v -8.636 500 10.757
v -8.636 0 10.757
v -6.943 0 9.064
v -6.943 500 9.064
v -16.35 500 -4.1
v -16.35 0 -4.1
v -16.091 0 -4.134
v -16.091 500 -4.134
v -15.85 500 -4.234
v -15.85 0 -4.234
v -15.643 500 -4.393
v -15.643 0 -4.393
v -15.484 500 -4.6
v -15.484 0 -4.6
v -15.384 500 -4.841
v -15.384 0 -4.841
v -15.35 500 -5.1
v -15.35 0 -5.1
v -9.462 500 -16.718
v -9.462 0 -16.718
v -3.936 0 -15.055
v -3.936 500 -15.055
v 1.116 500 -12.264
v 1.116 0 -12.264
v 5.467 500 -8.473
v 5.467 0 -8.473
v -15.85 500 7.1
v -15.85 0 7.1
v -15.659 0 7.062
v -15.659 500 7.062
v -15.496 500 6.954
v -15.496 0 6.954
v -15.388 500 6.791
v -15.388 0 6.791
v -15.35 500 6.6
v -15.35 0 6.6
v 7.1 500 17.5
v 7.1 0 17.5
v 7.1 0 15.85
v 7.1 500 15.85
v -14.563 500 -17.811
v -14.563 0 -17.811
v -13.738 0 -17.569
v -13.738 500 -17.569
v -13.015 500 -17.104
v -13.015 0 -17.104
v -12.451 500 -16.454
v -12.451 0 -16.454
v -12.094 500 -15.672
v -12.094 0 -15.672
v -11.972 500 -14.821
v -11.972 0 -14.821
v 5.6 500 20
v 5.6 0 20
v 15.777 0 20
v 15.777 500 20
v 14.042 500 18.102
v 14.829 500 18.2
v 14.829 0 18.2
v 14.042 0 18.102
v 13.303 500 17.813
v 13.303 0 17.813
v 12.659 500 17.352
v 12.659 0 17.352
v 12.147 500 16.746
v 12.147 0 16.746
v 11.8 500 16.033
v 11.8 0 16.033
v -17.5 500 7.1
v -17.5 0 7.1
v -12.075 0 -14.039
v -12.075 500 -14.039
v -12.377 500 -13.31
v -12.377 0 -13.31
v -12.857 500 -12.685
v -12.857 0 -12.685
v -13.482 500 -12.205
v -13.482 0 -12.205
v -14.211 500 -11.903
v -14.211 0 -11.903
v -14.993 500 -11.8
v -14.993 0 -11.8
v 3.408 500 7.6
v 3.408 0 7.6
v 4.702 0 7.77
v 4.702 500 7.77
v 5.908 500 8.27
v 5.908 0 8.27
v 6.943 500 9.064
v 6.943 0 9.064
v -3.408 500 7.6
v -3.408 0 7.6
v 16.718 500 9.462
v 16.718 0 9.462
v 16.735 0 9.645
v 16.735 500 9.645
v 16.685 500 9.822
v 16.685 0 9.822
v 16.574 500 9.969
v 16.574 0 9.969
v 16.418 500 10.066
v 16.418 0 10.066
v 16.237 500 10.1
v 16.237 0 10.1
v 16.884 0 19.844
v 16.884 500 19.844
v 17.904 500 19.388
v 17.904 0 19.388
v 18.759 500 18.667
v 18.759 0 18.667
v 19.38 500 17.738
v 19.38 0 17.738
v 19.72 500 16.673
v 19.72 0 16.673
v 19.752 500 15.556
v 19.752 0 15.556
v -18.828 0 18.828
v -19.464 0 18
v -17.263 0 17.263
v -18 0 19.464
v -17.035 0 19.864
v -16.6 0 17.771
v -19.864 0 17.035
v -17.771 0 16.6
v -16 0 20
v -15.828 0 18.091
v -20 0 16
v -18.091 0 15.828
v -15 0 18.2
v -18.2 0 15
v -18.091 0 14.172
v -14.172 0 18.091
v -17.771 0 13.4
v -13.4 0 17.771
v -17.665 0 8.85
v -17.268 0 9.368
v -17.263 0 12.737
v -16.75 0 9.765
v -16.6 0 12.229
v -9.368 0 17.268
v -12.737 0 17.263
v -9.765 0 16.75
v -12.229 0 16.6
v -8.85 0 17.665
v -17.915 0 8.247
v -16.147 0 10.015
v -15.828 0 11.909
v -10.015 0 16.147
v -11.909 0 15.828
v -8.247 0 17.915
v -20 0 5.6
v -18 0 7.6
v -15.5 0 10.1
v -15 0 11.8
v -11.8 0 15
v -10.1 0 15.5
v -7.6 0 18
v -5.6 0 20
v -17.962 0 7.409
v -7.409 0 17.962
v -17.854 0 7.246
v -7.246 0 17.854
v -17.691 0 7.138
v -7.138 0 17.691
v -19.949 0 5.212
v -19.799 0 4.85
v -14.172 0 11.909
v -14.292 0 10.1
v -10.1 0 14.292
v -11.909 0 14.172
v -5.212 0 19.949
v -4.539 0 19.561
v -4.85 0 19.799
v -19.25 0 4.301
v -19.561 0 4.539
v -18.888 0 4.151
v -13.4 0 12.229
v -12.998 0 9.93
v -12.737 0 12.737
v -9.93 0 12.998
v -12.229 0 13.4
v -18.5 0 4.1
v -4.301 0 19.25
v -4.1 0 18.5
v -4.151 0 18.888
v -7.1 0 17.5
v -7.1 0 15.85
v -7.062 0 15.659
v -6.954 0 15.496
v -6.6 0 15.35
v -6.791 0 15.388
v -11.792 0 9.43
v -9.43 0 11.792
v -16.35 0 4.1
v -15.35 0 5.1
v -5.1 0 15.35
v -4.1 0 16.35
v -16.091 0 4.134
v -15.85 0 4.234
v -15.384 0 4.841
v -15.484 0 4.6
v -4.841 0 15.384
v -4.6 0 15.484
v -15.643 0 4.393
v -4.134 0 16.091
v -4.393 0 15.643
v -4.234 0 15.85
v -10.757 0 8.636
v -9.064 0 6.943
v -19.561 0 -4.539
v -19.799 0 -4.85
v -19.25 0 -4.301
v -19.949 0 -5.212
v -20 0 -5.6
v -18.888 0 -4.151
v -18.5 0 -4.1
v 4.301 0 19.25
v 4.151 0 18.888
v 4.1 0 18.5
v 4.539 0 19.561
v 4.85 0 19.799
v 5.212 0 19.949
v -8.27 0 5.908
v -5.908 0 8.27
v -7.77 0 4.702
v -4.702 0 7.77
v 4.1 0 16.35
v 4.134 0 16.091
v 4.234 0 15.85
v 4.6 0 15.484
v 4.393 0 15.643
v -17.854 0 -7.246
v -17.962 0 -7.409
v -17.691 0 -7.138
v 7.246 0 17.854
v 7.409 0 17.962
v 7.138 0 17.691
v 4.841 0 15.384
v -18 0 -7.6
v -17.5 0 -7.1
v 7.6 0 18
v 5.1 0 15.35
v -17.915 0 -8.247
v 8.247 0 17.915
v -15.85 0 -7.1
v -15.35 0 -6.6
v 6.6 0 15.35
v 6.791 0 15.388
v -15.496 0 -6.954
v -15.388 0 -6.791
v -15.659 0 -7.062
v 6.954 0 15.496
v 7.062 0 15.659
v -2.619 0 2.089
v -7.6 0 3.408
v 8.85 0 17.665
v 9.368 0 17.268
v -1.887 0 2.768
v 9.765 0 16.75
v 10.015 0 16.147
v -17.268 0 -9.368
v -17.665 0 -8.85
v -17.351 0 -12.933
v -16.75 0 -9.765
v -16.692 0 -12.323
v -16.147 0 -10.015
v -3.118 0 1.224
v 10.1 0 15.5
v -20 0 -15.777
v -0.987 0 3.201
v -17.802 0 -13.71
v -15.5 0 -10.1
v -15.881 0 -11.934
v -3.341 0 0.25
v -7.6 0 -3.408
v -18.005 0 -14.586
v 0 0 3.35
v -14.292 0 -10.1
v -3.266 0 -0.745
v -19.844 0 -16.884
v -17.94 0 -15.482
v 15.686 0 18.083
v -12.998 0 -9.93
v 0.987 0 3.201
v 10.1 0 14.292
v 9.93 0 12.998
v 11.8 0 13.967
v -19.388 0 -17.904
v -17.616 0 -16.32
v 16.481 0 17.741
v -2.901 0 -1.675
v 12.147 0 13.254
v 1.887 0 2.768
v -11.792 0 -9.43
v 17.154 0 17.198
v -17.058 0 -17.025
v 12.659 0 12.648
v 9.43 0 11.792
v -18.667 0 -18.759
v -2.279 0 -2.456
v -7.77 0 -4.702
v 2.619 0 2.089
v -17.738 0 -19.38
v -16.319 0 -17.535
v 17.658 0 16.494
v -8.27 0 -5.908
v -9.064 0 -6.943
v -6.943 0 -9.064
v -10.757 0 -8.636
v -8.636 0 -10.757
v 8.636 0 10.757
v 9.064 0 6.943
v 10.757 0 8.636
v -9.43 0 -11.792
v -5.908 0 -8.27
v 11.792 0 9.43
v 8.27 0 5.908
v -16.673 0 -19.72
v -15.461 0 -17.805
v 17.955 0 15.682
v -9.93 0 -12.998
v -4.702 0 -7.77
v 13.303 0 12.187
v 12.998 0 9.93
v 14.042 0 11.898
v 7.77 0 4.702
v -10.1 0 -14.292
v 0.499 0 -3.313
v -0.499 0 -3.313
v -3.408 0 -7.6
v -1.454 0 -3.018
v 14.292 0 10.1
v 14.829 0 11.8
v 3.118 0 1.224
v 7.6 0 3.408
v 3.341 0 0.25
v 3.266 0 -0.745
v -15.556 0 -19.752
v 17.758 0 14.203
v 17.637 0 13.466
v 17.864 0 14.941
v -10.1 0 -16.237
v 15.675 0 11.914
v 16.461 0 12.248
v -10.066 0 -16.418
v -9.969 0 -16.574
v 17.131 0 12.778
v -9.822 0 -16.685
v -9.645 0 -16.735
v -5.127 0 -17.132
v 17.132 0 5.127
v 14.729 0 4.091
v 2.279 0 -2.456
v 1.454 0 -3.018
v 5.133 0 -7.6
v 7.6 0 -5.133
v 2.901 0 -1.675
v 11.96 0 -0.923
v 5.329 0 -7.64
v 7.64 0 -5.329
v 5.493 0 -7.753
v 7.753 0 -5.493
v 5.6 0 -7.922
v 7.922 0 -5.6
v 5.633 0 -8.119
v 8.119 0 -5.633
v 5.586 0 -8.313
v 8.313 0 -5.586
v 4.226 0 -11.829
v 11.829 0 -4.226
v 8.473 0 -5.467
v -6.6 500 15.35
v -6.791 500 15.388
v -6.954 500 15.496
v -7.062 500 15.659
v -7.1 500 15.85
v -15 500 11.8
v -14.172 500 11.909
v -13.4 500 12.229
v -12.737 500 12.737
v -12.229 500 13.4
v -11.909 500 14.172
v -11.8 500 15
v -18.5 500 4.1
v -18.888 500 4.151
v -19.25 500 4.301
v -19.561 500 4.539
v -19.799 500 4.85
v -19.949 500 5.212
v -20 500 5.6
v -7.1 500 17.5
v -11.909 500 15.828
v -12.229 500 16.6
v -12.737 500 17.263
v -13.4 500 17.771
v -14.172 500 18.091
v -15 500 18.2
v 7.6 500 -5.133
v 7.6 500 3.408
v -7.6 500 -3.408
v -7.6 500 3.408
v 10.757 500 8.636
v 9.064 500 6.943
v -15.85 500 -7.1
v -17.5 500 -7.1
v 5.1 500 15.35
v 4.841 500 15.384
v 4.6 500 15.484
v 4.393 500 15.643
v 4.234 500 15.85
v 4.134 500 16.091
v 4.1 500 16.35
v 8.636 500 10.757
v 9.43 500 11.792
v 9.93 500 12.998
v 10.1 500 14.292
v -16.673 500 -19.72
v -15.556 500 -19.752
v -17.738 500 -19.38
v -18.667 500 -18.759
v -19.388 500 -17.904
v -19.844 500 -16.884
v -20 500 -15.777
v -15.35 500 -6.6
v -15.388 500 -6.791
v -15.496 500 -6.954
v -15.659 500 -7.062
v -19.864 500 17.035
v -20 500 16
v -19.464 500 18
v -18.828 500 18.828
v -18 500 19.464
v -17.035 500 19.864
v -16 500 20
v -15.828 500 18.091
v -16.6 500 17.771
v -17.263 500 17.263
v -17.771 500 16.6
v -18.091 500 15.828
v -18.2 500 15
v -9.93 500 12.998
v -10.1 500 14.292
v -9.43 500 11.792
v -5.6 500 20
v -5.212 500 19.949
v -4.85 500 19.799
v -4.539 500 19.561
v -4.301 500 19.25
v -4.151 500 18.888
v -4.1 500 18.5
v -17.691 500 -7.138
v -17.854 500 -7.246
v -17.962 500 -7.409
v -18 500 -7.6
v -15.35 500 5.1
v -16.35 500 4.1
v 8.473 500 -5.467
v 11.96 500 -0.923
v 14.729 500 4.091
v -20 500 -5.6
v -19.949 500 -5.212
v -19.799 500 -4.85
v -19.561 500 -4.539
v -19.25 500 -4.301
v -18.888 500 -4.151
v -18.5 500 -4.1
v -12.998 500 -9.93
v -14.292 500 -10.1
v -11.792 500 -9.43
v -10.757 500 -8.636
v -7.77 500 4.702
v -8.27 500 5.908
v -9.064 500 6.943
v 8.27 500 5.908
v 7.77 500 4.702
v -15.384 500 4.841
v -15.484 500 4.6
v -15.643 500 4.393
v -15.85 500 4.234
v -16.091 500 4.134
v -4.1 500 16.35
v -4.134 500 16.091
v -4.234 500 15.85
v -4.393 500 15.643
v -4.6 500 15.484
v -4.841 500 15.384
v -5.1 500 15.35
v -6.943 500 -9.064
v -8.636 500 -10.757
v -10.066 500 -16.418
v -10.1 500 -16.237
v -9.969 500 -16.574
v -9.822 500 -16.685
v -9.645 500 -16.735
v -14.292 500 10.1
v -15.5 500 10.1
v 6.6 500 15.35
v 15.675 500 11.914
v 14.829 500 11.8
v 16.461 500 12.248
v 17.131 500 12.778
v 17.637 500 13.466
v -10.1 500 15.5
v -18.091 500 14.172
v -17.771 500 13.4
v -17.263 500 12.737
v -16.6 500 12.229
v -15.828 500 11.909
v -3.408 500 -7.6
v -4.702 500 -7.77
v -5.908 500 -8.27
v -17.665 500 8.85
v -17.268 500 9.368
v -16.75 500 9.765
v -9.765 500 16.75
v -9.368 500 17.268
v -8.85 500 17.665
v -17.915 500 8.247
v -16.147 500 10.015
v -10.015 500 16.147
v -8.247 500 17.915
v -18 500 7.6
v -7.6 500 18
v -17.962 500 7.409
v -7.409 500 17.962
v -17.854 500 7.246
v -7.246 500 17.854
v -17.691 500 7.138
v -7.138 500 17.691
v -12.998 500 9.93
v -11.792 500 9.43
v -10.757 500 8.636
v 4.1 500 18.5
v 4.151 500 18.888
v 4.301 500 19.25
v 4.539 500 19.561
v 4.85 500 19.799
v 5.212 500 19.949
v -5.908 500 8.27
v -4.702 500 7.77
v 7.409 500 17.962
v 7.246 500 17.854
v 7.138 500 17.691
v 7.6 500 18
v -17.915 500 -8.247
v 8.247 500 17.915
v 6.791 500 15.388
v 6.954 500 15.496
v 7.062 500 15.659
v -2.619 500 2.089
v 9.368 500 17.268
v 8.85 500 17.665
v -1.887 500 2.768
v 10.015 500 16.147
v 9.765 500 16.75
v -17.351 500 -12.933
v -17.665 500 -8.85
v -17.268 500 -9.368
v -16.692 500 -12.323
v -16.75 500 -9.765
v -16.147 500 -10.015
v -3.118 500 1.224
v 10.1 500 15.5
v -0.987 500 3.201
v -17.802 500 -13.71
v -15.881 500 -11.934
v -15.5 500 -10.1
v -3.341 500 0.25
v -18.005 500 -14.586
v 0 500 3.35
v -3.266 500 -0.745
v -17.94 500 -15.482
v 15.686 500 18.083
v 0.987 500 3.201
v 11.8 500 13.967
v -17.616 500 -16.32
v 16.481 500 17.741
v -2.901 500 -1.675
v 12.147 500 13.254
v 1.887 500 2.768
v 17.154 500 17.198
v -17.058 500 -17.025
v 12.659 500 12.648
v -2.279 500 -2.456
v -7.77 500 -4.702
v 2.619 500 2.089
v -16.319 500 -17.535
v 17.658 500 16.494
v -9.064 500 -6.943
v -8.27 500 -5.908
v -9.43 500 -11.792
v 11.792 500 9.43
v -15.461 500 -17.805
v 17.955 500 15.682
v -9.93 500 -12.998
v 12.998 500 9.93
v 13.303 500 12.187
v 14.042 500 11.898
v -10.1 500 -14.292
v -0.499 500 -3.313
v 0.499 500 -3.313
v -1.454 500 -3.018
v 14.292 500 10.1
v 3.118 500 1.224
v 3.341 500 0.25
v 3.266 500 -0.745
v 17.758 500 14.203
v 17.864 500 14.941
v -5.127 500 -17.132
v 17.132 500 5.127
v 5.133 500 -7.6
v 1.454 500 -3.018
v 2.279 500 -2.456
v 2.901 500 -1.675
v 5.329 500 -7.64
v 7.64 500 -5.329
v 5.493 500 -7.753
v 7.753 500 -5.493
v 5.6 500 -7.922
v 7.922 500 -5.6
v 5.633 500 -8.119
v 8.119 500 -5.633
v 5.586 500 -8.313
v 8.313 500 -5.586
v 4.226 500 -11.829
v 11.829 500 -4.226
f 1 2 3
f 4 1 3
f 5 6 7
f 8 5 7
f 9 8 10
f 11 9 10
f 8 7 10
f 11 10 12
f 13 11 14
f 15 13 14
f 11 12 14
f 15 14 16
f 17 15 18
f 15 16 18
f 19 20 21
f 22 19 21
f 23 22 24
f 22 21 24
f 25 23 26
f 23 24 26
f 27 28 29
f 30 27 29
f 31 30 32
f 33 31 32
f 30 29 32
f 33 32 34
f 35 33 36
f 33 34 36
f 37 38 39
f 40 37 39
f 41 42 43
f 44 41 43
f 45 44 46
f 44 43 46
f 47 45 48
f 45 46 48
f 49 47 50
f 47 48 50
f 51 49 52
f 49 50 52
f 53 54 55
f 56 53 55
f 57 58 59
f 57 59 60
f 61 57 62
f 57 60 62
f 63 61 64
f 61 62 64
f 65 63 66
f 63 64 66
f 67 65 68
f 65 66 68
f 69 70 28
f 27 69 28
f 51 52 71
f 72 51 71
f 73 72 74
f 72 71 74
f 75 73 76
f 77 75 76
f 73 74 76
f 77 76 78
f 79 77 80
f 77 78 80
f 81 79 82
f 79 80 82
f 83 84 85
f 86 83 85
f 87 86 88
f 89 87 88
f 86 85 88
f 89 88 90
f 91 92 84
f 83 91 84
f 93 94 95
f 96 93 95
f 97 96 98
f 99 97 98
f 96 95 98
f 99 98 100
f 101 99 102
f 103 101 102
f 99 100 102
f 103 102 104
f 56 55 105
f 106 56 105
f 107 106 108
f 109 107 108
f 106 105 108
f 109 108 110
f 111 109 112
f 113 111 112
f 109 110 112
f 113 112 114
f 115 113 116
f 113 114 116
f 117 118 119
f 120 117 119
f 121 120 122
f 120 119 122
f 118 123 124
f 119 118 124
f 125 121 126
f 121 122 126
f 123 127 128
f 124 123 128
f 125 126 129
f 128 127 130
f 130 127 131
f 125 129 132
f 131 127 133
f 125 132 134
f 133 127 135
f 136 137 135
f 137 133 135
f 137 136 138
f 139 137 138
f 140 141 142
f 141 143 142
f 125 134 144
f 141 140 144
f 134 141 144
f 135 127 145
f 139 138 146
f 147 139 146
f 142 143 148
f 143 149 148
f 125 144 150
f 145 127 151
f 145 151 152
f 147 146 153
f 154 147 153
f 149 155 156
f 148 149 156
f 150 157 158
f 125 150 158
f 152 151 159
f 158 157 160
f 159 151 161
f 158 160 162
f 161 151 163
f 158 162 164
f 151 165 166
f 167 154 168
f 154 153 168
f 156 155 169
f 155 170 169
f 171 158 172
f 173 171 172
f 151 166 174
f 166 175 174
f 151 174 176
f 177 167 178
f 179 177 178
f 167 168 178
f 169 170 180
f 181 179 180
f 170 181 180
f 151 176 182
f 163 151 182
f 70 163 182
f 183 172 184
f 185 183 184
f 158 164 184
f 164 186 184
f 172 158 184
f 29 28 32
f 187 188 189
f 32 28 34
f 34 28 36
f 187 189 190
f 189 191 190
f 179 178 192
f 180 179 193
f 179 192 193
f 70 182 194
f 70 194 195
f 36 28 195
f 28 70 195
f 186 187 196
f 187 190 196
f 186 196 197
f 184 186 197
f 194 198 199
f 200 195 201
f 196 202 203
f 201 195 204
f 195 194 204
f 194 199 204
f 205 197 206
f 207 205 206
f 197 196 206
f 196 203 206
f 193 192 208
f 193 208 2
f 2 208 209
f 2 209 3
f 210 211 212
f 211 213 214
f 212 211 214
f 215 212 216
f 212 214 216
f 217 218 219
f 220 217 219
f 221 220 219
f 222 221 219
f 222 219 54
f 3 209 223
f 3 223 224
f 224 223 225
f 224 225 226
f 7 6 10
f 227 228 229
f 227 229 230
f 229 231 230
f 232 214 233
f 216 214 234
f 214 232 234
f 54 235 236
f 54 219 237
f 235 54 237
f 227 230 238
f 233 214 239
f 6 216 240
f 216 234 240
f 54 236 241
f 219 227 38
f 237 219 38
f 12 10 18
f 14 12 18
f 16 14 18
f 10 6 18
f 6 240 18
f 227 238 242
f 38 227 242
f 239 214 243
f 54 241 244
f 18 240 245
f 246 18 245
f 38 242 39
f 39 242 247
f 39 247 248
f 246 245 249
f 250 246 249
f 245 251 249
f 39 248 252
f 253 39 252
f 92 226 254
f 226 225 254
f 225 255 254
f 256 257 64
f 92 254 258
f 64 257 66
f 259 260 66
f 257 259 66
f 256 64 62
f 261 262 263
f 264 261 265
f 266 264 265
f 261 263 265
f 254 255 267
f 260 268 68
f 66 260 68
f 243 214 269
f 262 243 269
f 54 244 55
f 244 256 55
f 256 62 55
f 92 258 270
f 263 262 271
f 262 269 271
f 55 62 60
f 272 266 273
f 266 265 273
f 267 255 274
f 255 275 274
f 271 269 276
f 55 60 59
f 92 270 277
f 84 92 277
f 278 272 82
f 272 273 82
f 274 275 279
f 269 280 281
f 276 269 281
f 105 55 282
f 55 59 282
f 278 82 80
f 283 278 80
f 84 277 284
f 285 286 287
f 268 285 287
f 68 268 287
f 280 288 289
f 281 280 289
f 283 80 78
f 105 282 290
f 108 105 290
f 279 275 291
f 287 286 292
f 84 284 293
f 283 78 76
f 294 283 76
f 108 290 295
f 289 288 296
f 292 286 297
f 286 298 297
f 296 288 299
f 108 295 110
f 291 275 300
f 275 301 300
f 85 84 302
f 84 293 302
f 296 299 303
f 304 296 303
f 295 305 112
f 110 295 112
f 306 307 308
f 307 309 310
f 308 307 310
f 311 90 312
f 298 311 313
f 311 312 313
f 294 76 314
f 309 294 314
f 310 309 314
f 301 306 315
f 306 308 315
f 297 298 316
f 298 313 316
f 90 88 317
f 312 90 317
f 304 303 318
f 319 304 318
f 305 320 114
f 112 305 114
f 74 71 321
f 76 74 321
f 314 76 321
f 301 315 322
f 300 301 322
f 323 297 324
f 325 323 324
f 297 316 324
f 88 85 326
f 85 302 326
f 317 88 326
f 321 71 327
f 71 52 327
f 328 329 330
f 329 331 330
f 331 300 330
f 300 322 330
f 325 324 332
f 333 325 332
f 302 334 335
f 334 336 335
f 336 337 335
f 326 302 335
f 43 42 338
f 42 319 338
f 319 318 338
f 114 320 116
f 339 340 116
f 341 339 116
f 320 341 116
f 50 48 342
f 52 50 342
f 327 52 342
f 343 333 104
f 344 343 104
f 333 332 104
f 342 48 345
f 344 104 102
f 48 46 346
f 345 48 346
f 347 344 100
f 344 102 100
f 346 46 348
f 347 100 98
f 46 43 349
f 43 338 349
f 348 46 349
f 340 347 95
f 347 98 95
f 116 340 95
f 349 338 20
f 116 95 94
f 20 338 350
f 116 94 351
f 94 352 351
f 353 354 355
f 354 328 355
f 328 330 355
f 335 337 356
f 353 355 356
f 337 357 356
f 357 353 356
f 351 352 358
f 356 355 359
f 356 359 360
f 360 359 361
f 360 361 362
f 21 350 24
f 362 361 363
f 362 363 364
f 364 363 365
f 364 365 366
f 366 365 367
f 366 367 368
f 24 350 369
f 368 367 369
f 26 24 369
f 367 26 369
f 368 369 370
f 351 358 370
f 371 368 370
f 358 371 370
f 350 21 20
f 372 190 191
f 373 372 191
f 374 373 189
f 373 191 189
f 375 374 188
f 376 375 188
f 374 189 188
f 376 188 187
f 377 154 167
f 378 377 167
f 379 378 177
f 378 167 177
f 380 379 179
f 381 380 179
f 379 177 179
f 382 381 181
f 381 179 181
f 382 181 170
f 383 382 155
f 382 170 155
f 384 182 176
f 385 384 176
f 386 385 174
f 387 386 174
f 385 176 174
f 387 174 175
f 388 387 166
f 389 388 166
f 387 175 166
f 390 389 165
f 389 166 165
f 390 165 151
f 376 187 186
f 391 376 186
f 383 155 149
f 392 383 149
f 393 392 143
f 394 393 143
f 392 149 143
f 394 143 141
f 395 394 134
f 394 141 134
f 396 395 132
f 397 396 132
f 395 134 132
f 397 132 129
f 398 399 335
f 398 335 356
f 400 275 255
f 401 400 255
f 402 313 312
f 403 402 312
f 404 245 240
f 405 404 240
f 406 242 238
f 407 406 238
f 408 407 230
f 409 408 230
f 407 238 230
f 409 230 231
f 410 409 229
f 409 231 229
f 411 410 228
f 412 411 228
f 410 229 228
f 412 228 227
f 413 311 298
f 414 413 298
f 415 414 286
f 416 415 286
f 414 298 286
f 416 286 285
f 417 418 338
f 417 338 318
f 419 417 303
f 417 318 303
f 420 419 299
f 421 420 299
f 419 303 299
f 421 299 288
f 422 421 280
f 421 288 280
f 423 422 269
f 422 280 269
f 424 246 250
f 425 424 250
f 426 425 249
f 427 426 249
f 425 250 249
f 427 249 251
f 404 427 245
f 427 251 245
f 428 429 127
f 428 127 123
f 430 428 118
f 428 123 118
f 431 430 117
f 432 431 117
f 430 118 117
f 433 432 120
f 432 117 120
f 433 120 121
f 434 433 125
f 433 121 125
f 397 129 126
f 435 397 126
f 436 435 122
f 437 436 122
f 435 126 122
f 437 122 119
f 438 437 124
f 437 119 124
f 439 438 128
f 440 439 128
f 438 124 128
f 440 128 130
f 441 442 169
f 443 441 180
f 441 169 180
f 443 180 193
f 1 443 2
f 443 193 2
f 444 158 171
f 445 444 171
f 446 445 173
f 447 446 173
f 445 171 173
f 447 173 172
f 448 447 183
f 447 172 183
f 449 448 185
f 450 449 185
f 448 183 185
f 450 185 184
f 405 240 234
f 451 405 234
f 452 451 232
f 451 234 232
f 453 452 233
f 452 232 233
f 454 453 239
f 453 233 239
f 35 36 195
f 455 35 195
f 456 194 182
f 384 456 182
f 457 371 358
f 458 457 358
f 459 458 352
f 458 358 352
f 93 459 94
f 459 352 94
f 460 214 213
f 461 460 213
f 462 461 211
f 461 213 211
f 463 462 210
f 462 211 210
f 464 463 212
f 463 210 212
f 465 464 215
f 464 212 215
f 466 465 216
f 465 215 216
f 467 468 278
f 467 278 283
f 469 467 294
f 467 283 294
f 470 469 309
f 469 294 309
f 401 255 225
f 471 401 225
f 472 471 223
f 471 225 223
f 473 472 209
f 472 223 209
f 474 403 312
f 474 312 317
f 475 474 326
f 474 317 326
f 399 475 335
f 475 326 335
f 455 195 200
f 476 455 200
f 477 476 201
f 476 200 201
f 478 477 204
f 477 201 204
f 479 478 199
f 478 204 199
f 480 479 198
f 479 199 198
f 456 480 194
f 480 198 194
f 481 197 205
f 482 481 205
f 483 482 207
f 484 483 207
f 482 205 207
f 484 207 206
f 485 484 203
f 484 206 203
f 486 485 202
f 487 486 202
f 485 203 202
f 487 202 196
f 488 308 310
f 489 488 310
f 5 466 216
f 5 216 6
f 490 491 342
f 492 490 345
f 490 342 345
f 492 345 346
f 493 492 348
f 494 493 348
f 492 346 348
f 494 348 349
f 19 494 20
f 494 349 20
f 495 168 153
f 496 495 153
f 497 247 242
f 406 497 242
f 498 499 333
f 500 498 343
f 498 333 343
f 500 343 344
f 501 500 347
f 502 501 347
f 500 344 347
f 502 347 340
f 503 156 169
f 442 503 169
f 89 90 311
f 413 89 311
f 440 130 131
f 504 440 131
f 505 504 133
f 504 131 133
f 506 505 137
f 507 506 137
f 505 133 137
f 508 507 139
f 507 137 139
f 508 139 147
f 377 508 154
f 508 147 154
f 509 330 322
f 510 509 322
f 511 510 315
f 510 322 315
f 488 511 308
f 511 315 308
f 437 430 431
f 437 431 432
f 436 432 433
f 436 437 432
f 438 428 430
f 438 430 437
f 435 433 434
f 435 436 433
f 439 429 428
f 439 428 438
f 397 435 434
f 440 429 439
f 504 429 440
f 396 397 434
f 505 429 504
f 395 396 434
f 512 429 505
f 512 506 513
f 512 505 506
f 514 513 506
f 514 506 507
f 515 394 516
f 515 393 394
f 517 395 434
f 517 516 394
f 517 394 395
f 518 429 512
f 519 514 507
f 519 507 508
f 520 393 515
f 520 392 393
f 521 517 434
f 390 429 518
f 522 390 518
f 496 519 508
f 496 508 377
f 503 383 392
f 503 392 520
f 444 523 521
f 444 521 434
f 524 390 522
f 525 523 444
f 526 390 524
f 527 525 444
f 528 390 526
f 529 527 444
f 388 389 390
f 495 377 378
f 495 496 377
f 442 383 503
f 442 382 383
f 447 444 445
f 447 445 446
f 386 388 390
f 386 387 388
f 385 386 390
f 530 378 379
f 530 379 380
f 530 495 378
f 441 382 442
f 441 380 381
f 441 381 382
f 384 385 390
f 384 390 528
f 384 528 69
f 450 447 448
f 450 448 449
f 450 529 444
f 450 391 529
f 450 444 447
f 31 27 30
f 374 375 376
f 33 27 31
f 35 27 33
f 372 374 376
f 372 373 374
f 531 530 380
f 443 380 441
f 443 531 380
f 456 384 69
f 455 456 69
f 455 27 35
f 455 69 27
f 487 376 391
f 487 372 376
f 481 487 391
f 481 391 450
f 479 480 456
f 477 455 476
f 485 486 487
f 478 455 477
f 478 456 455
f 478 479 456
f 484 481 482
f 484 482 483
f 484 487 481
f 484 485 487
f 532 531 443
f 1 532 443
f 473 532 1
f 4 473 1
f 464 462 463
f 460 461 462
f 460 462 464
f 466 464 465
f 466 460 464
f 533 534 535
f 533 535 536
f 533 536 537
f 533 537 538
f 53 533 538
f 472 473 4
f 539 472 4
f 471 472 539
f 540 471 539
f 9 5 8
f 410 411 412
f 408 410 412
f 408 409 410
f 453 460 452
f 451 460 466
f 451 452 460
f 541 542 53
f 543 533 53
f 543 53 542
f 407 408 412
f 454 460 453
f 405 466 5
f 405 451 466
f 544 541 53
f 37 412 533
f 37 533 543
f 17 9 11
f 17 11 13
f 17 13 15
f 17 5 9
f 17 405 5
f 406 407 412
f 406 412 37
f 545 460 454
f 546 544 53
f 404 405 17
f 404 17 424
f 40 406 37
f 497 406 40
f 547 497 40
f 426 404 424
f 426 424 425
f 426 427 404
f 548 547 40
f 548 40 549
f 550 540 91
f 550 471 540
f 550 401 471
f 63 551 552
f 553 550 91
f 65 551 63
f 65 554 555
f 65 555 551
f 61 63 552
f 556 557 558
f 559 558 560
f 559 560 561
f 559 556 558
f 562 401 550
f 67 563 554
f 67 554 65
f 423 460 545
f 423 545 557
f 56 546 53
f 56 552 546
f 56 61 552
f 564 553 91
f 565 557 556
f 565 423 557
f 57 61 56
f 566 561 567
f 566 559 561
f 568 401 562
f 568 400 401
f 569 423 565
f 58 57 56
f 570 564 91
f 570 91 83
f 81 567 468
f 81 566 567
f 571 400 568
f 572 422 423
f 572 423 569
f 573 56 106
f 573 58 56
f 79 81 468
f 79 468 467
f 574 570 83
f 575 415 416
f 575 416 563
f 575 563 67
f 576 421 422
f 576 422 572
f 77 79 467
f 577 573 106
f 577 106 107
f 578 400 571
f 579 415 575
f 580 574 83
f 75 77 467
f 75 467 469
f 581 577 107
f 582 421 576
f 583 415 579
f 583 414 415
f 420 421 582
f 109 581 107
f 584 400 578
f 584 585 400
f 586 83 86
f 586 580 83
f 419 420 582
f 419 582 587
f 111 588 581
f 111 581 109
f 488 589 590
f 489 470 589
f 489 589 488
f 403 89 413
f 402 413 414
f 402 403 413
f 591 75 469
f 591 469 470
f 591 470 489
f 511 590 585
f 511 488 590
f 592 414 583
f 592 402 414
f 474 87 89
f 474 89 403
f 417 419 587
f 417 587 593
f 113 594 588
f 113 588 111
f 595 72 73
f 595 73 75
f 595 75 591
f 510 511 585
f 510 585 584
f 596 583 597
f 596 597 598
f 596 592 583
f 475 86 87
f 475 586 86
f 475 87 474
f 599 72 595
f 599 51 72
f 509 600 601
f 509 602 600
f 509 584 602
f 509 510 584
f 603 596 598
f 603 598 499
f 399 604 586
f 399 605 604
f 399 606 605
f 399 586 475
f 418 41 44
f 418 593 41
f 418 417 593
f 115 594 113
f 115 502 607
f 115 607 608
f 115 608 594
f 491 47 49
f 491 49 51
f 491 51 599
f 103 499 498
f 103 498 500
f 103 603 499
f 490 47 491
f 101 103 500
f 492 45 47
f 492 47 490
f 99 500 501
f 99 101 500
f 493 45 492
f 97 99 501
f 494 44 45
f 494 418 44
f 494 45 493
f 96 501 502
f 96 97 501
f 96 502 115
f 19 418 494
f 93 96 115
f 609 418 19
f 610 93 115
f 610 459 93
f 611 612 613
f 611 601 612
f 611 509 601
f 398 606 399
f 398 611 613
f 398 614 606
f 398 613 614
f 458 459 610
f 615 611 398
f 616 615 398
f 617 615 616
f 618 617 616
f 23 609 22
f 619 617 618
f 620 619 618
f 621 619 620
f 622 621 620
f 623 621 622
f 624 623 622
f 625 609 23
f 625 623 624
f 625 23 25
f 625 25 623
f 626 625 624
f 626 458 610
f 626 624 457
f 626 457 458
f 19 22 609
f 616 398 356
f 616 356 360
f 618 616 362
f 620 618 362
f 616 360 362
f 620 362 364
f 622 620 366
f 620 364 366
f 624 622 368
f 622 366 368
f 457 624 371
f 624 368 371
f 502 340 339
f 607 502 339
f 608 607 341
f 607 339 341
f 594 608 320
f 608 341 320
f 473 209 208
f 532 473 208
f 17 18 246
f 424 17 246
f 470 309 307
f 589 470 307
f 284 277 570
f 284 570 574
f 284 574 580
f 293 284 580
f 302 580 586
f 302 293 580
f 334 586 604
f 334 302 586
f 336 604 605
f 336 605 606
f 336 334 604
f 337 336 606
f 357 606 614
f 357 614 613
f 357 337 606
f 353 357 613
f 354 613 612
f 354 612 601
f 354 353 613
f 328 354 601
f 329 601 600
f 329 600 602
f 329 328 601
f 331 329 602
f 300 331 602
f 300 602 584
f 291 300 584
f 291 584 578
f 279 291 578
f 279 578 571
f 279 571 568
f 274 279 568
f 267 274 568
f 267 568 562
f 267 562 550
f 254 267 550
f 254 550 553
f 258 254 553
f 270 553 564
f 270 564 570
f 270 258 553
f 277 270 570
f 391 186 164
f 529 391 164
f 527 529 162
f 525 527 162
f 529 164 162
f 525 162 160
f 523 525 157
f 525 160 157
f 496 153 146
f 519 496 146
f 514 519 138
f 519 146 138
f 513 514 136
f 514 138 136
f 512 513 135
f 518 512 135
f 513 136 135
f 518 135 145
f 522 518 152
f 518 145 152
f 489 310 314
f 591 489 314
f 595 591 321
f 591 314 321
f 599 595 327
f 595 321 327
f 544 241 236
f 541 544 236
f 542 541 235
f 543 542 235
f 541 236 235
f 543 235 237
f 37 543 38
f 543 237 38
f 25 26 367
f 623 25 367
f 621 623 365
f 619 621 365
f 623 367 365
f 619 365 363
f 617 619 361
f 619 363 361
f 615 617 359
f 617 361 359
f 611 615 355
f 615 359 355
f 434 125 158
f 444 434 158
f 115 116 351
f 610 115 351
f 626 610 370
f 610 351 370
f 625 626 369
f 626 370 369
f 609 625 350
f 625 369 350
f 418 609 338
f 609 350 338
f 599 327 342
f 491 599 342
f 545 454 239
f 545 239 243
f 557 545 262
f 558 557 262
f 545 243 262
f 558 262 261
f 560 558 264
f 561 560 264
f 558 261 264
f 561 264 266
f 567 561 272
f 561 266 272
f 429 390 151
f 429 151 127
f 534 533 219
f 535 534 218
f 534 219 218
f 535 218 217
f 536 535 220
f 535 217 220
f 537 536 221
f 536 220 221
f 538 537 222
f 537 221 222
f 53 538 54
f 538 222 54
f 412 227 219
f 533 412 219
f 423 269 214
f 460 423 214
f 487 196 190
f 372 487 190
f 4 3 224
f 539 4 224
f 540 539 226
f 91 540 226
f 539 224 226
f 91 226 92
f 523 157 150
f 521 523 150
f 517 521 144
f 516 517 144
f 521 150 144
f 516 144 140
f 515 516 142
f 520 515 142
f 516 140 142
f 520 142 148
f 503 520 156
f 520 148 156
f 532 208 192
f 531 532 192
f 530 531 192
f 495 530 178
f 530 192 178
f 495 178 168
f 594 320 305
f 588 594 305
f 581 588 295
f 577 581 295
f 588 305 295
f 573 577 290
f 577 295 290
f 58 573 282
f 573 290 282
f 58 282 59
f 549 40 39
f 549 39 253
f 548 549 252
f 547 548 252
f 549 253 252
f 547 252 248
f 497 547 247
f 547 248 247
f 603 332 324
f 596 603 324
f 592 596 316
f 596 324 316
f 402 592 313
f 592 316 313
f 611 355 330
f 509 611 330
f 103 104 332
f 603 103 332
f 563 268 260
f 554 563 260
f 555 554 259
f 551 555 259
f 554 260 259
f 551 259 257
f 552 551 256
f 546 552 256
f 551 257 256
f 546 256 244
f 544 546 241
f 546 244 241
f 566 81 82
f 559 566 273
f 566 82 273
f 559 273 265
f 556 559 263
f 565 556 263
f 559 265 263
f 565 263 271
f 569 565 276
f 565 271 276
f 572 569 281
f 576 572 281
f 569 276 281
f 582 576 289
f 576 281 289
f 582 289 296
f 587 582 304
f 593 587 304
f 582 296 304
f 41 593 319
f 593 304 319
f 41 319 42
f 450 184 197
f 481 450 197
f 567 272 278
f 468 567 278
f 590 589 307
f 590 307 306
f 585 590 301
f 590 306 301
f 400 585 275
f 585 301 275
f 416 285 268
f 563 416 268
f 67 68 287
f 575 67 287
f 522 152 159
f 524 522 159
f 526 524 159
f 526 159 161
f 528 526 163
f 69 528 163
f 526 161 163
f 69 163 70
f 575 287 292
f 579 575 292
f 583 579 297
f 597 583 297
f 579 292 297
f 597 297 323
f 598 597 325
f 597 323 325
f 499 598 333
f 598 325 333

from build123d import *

# Parameters (mm, degrees)
CROQUIS1_R              = 3.35
SALIENTE_EXTRUIR1_DEPTH = 500
SALIENTE_EXTRUIR2_START = -500
SALIENTE_EXTRUIR2_DEPTH = 500


with BuildPart() as part:
    # Croquis1 → Saliente-Extruir1 (new body)
    with BuildSketch(Plane(origin=(0, 0, 0), x_dir=(1, 0, 0), z_dir=(0, 1, 0))):
        with BuildLine():
            Line((4.099999986, -16.349999949), (4.099999986, -18.499999949))
            ThreePointArc((4.099999986, -18.499999949), (4.539339815, -19.560660121), (5.599999987, -19.999999949))
            Line((5.599999987, -19.999999949), (15.777087623, -19.999999949))
            ThreePointArc((15.777087623, -19.999999949), (18.758511608, -18.66666665), (19.752319619, -15.555555546))
            ThreePointArc((19.752319619, -15.555555546), (8.284271243, 8.284271252), (-15.555555578, 19.752319582))
            ThreePointArc((-15.555555578, 19.752319582), (-18.666666685, 18.758511591), (-20.000000016, 15.777087623))
            Line((-20.000000016, 15.777087623), (-20.000000016, 5.599999985))
            ThreePointArc((-20.000000016, 5.599999985), (-19.560660185, 4.539339815), (-18.500000013, 4.099999988))
            Line((-18.500000013, 4.099999988), (-16.350000012, 4.099999988))
            ThreePointArc((-16.350000012, 4.099999988), (-15.642893231, 4.392893207), (-15.350000012, 5.099999988))
            Line((-15.350000012, 5.099999988), (-15.350000012, 6.599999984))
            ThreePointArc((-15.350000012, 6.599999984), (-15.49644662, 6.953553378), (-15.850000012, 7.099999989))
            Line((-15.850000012, 7.099999989), (-17.500000009, 7.099999989))
            ThreePointArc((-17.500000009, 7.099999989), (-17.853553401, 7.246446596), (-18.000000013, 7.599999985))
            ThreePointArc((-18.000000013, 7.599999985), (-17.267766972, 9.36776695), (-15.500000013, 10.100000003))
            Line((-15.500000013, 10.100000003), (-14.292388135, 10.100000003))
            ThreePointArc((-14.292388135, 10.100000003), (-12.378970991, 9.719397659), (-10.756854262, 8.635533909))
            Line((-10.756854262, 8.635533909), (-9.064466108, 6.943145756))
            ThreePointArc((-9.064466108, 6.943145756), (-7.980602349, 5.32102901), (-7.60000001, 3.407611846))
            Line((-7.60000001, 3.407611846), (-7.60000001, -3.407611843))
            ThreePointArc((-7.60000001, -3.407611843), (-7.980602347, -5.321029004), (-9.064466104, -6.943145748))
            Line((-9.064466104, -6.943145748), (-10.756854257, -8.635533901))
            ThreePointArc((-10.756854257, -8.635533901), (-12.378971003, -9.719397661), (-14.292388167, -10.099999999))
            Line((-14.292388167, -10.099999999), (-15.499999985, -10.099999999))
            ThreePointArc((-15.499999985, -10.099999999), (-17.267766956, -9.367766956), (-18.000000007, -7.599999987))
            ThreePointArc((-18.000000007, -7.599999987), (-17.853553397, -7.246446598), (-17.500000007, -7.099999989))
            Line((-17.500000007, -7.099999989), (-15.850000011, -7.099999989))
            ThreePointArc((-15.850000011, -7.099999989), (-15.496446618, -6.953553381), (-15.350000008, -6.599999989))
            Line((-15.350000008, -6.599999989), (-15.350000008, -5.099999989))
            ThreePointArc((-15.350000008, -5.099999989), (-15.642893227, -4.392893209), (-16.350000008, -4.09999999))
            Line((-16.350000008, -4.09999999), (-18.500000008, -4.09999999))
            ThreePointArc((-18.500000008, -4.09999999), (-19.56066018, -4.539339819), (-20.000000008, -5.599999991))
            Line((-20.000000008, -5.599999991), (-20.000000008, -15.999999939))
            ThreePointArc((-20.000000008, -15.999999939), (-18.828427101, -18.828427077), (-15.999999951, -19.999999954))
            Line((-15.999999951, -19.999999954), (-5.599999986, -19.999999954))
            ThreePointArc((-5.599999986, -19.999999954), (-4.539339818, -19.560660123), (-4.099999992, -18.499999954))
            Line((-4.099999992, -18.499999954), (-4.099999992, -16.349999953))
            ThreePointArc((-4.099999992, -16.349999953), (-4.392893211, -15.642893171), (-5.099999992, -15.349999953))
            Line((-5.099999992, -15.349999953), (-6.599999988, -15.349999953))
            ThreePointArc((-6.599999988, -15.349999953), (-6.953553382, -15.49644656), (-7.099999993, -15.849999953))
            Line((-7.099999993, -15.849999953), (-7.099999993, -17.499999952))
            ThreePointArc((-7.099999993, -17.499999952), (-7.2464466, -17.853553342), (-7.599999989, -17.999999954))
            ThreePointArc((-7.599999989, -17.999999954), (-9.367766954, -17.267766913), (-10.100000007, -15.499999954))
            Line((-10.100000007, -15.499999954), (-10.100000007, -14.292388076))
            ThreePointArc((-10.100000007, -14.292388076), (-9.719397663, -12.378970931), (-8.635533913, -10.756854202))
            Line((-8.635533913, -10.756854202), (-6.94314576, -9.064466049))
            ThreePointArc((-6.94314576, -9.064466049), (-5.321029014, -7.980602289), (-3.40761185, -7.599999951))
            Line((-3.40761185, -7.599999951), (3.407611837, -7.599999951))
            ThreePointArc((3.407611837, -7.599999951), (5.321028999, -7.980602288), (6.943145744, -9.064466044))
            Line((6.943145744, -9.064466044), (8.635533897, -10.756854198))
            ThreePointArc((8.635533897, -10.756854198), (9.719397657, -12.378970943), (10.099999995, -14.292388108))
            Line((10.099999995, -14.292388108), (10.099999995, -15.499999937))
            ThreePointArc((10.099999995, -15.499999937), (9.367766948, -17.267766901), (7.599999983, -17.999999948))
            ThreePointArc((7.599999983, -17.999999948), (7.246446594, -17.853553337), (7.099999985, -17.499999948))
            Line((7.099999985, -17.499999948), (7.099999985, -15.849999952))
            ThreePointArc((7.099999985, -15.849999952), (6.953553377, -15.496446559), (6.599999985, -15.349999949))
            Line((6.599999985, -15.349999949), (5.099999986, -15.349999949))
            ThreePointArc((5.099999986, -15.349999949), (4.392893205, -15.642893168), (4.099999986, -16.349999949))
        make_face()
        with Locations(Location((0, 0, 0), (0, 0, 270))):
            Circle(CROQUIS1_R, mode=Mode.SUBTRACT)
        with BuildLine():
            Line((-18.200000016, 12.299999981), (-18.200000016, 15.777087623))
            ThreePointArc((-18.200000016, 15.777087623), (-17.466666684, 17.416870805), (-15.755555575, 17.963465201))
            ThreePointArc((-15.755555575, 17.963465201), (-13.970008189, 17.721071), (-12.197878052, 17.394744174))
            ThreePointArc((-12.197878052, 17.394744174), (-11.91201741, 17.22067196), (-11.800000067, 16.905284013))
            Line((-11.800000067, 16.905284013), (-11.800000067, 12.299999704))
            ThreePointArc((-11.800000067, 12.299999704), (-11.946446503, 11.946446622), (-12.299999521, 11.800000031))
            Line((-12.299999521, 11.800000031), (-17.700000056, 11.800000031))
            ThreePointArc((-17.700000056, 11.800000031), (-18.053553418, 11.946446622), (-18.200000016, 12.299999981))
        make_face(mode=Mode.SUBTRACT)
        with BuildLine():
            Line((11.800000005, -17.699999962), (11.800000005, -12.299999803))
            ThreePointArc((11.800000005, -12.299999803), (11.946446442, -11.946446721), (12.299999459, -11.80000013))
            Line((12.299999459, -11.80000013), (16.905284227, -11.80000013))
            ThreePointArc((16.905284227, -11.80000013), (17.220672032, -11.912017476), (17.394744196, -12.197877993))
            ThreePointArc((17.394744196, -12.197877993), (17.721071033, -13.970008163), (17.963465241, -15.755555583))
            ThreePointArc((17.963465241, -15.755555583), (17.416870817, -17.466666655), (15.777087646, -18.199999948))
            Line((15.777087646, -18.199999948), (12.300000016, -18.199999948))
            ThreePointArc((12.300000016, -18.199999948), (11.946446626, -18.053553344), (11.800000005, -17.699999962))
        make_face(mode=Mode.SUBTRACT)
        with BuildLine():
            Line((-18.200000037, -15.999999938), (-18.200000037, -12.29999998))
            ThreePointArc((-18.200000037, -12.29999998), (-18.053553433, -11.94644659), (-17.70000005, -11.799999969))
            Line((-17.70000005, -11.799999969), (-12.299999814, -11.799999969))
            ThreePointArc((-12.299999814, -11.799999969), (-11.946446646, -11.946446393), (-11.800000043, -12.299999487))
            Line((-11.800000043, -12.299999487), (-11.800000043, -17.700000023))
            ThreePointArc((-11.800000043, -17.700000023), (-11.946446635, -18.053553384), (-12.299999994, -18.199999983))
            Line((-12.299999994, -18.199999983), (-15.999999951, -18.199999983))
            ThreePointArc((-15.999999951, -18.199999983), (-17.555634915, -17.555634891), (-18.200000037, -15.999999938))
        make_face(mode=Mode.SUBTRACT)
        with BuildLine():
            Line((-10.100000018, 14.292388152), (-10.100000018, 16.237135643))
            ThreePointArc((-10.100000018, 16.237135643), (-9.900860854, 16.636488564), (-9.462068989, 16.717734255))
            ThreePointArc((-9.462068989, 16.717734255), (-1.335812596, 13.79371517), (5.466577064, 8.472679041))
            ThreePointArc((5.466577064, 8.472679041), (5.600331365, 7.921589685), (5.133244904, 7.599999995))
            Line((5.133244904, 7.599999995), (-3.407611859, 7.599999995))
            ThreePointArc((-3.407611859, 7.599999995), (-5.321029022, 7.980602332), (-6.943145766, 9.064466088))
            Line((-6.943145766, 9.064466088), (-8.63553392, 10.756854242))
            ThreePointArc((-8.63553392, 10.756854242), (-9.719397679, 12.378970987), (-10.100000018, 14.292388152))
        make_face(mode=Mode.SUBTRACT)
        with BuildLine():
            Line((16.237135661, -10.099999987), (14.292388142, -10.099999987))
            ThreePointArc((14.292388142, -10.099999987), (12.378970987, -9.719397647), (10.75685425, -8.635533892))
            Line((10.75685425, -8.635533892), (9.064466096, -6.943145739))
            ThreePointArc((9.064466096, -6.943145739), (7.980602337, -5.321028994), (7.599999998, -3.407611829))
            Line((7.599999998, -3.407611829), (7.599999998, 5.133244926))
            ThreePointArc((7.599999998, 5.133244926), (7.921589687, 5.600331384), (8.472679039, 5.466577086))
            ThreePointArc((8.472679039, 5.466577086), (13.438953564, -1.531746557), (16.71773428, -9.462068964))
            ThreePointArc((16.71773428, -9.462068964), (16.636488582, -9.900860826), (16.237135661, -10.099999987))
        make_face(mode=Mode.SUBTRACT)
    extrude(amount=SALIENTE_EXTRUIR1_DEPTH)

    # Croquis2 → Saliente-Extruir2 (add)
    with BuildSketch(Plane(origin=(0, 500, 0), x_dir=(1, 0, 0), z_dir=(0, 1, 0)).offset(SALIENTE_EXTRUIR2_START)):
        with BuildLine():
            ThreePointArc((-15.00000005, -11.799999969), (-12.737258345, -12.737258271), (-11.800000043, -14.999999976))
            Line((-11.800000043, -14.999999976), (-11.800000043, -12.299999487))
            ThreePointArc((-11.800000043, -12.299999487), (-11.946446646, -11.946446393), (-12.299999814, -11.799999969))
            Line((-12.299999814, -11.799999969), (-15.00000005, -11.799999969))
        make_face()
        with BuildLine():
            ThreePointArc((-11.800000043, -14.999999976), (-12.737258345, -17.26274168), (-15.00000005, -18.199999983))
            Line((-15.00000005, -18.199999983), (-12.299999994, -18.199999983))
            ThreePointArc((-12.299999994, -18.199999983), (-11.946446635, -18.053553384), (-11.800000043, -17.700000023))
            Line((-11.800000043, -17.700000023), (-11.800000043, -14.999999976))
        make_face()
        with BuildLine():
            ThreePointArc((-18.200000037, -15.999999938), (-17.555634915, -17.555634891), (-15.999999951, -18.199999983))
            Line((-15.999999951, -18.199999983), (-15.00000005, -18.199999983))
            ThreePointArc((-15.00000005, -18.199999983), (-17.262741755, -17.26274168), (-18.200000057, -14.999999976))
            Line((-18.200000037, -14.999999976), (-18.200000037, -15.999999938))
        make_face()
        with BuildLine():
            Line((-18.200000037, -12.29999998), (-18.200000037, -14.999999976))
            ThreePointArc((-18.200000057, -14.999999976), (-17.262741755, -12.737258271), (-15.00000005, -11.799999969))
            Line((-15.00000005, -11.799999969), (-17.70000005, -11.799999969))
            ThreePointArc((-17.70000005, -11.799999969), (-18.053553433, -11.94644659), (-18.200000037, -12.29999998))
        make_face()
        with BuildLine():
            ThreePointArc((-15.755555575, 17.963465201), (-17.466666684, 17.416870805), (-18.200000016, 15.777087623))
            Line((-18.200000016, 15.777087623), (-18.200000016, 12.299999981))
            ThreePointArc((-18.200000016, 12.299999981), (-18.053553418, 11.946446622), (-17.700000056, 11.800000031))
            Line((-17.700000056, 11.800000031), (-14.992840663, 11.800000031))
            ThreePointArc((-14.992840663, 11.800000031), (-18.006058488, 15.03645487), (-14.562863205, 17.811076975))
            ThreePointArc((-14.562863205, 17.811076975), (-15.158609779, 17.891964046), (-15.755555575, 17.963465201))
        make_face()
        with BuildLine():
            ThreePointArc((-12.197878052, 17.394744174), (-13.37709835, 17.621498805), (-14.562863205, 17.811076975))
            ThreePointArc((-14.562863205, 17.811076975), (-12.709765496, 16.799175178), (-11.971923864, 14.82091683))
            ThreePointArc((-11.971923864, 14.82091683), (-12.856729909, 12.684806076), (-14.992840663, 11.800000031))
            Line((-14.992840663, 11.800000031), (-12.299999521, 11.800000031))
            ThreePointArc((-12.299999521, 11.800000031), (-11.946446503, 11.946446622), (-11.800000067, 12.299999704))
            Line((-11.800000067, 12.299999704), (-11.800000067, 16.905284013))
            ThreePointArc((-11.800000067, 16.905284013), (-11.91201741, 17.22067196), (-12.197878052, 17.394744174))
        make_face()
        with BuildLine():
            Line((16.905284227, -11.80000013), (14.828541229, -11.80000013))
            ThreePointArc((14.828541229, -11.80000013), (16.461401303, -12.247952184), (17.637109474, -13.466395191))
            ThreePointArc((17.637109474, -13.466395191), (17.521287961, -12.831112285), (17.394744196, -12.197877993))
            ThreePointArc((17.394744196, -12.197877993), (17.220672032, -11.912017476), (16.905284227, -11.80000013))
        make_face()
        with BuildLine():
            Line((11.800000005, -12.299999803), (11.800000005, -13.966589436))
            ThreePointArc((11.800000005, -13.966589436), (12.966675823, -12.397413513), (14.828541229, -11.80000013))
            Line((14.828541229, -11.80000013), (12.299999459, -11.80000013))
            ThreePointArc((12.299999459, -11.80000013), (11.946446442, -11.946446721), (11.800000005, -12.299999803))
        make_face()
        with BuildLine():
            ThreePointArc((11.800000005, -17.699999962), (11.946446626, -18.053553344), (12.300000016, -18.199999948))
            Line((12.300000016, -18.199999948), (14.828541229, -18.199999948))
            ThreePointArc((14.828541229, -18.199999948), (12.966675823, -17.602586565), (11.800000005, -16.033410642))
            Line((11.800000005, -16.033410642), (11.800000005, -17.699999962))
        make_face()
        with BuildLine():
            ThreePointArc((17.955118446, -15.681552916), (16.835906452, -17.492084364), (14.828541229, -18.199999948))
            Line((14.828541229, -18.199999948), (15.777087646, -18.199999948))
            ThreePointArc((15.777087646, -18.199999948), (17.416870817, -17.466666655), (17.963465241, -15.755555583))
            ThreePointArc((17.963465241, -15.755555583), (17.959309877, -15.718552215), (17.955118446, -15.681552916))
        make_face()
    extrude(amount=SALIENTE_EXTRUIR2_DEPTH)


solid = part.part
